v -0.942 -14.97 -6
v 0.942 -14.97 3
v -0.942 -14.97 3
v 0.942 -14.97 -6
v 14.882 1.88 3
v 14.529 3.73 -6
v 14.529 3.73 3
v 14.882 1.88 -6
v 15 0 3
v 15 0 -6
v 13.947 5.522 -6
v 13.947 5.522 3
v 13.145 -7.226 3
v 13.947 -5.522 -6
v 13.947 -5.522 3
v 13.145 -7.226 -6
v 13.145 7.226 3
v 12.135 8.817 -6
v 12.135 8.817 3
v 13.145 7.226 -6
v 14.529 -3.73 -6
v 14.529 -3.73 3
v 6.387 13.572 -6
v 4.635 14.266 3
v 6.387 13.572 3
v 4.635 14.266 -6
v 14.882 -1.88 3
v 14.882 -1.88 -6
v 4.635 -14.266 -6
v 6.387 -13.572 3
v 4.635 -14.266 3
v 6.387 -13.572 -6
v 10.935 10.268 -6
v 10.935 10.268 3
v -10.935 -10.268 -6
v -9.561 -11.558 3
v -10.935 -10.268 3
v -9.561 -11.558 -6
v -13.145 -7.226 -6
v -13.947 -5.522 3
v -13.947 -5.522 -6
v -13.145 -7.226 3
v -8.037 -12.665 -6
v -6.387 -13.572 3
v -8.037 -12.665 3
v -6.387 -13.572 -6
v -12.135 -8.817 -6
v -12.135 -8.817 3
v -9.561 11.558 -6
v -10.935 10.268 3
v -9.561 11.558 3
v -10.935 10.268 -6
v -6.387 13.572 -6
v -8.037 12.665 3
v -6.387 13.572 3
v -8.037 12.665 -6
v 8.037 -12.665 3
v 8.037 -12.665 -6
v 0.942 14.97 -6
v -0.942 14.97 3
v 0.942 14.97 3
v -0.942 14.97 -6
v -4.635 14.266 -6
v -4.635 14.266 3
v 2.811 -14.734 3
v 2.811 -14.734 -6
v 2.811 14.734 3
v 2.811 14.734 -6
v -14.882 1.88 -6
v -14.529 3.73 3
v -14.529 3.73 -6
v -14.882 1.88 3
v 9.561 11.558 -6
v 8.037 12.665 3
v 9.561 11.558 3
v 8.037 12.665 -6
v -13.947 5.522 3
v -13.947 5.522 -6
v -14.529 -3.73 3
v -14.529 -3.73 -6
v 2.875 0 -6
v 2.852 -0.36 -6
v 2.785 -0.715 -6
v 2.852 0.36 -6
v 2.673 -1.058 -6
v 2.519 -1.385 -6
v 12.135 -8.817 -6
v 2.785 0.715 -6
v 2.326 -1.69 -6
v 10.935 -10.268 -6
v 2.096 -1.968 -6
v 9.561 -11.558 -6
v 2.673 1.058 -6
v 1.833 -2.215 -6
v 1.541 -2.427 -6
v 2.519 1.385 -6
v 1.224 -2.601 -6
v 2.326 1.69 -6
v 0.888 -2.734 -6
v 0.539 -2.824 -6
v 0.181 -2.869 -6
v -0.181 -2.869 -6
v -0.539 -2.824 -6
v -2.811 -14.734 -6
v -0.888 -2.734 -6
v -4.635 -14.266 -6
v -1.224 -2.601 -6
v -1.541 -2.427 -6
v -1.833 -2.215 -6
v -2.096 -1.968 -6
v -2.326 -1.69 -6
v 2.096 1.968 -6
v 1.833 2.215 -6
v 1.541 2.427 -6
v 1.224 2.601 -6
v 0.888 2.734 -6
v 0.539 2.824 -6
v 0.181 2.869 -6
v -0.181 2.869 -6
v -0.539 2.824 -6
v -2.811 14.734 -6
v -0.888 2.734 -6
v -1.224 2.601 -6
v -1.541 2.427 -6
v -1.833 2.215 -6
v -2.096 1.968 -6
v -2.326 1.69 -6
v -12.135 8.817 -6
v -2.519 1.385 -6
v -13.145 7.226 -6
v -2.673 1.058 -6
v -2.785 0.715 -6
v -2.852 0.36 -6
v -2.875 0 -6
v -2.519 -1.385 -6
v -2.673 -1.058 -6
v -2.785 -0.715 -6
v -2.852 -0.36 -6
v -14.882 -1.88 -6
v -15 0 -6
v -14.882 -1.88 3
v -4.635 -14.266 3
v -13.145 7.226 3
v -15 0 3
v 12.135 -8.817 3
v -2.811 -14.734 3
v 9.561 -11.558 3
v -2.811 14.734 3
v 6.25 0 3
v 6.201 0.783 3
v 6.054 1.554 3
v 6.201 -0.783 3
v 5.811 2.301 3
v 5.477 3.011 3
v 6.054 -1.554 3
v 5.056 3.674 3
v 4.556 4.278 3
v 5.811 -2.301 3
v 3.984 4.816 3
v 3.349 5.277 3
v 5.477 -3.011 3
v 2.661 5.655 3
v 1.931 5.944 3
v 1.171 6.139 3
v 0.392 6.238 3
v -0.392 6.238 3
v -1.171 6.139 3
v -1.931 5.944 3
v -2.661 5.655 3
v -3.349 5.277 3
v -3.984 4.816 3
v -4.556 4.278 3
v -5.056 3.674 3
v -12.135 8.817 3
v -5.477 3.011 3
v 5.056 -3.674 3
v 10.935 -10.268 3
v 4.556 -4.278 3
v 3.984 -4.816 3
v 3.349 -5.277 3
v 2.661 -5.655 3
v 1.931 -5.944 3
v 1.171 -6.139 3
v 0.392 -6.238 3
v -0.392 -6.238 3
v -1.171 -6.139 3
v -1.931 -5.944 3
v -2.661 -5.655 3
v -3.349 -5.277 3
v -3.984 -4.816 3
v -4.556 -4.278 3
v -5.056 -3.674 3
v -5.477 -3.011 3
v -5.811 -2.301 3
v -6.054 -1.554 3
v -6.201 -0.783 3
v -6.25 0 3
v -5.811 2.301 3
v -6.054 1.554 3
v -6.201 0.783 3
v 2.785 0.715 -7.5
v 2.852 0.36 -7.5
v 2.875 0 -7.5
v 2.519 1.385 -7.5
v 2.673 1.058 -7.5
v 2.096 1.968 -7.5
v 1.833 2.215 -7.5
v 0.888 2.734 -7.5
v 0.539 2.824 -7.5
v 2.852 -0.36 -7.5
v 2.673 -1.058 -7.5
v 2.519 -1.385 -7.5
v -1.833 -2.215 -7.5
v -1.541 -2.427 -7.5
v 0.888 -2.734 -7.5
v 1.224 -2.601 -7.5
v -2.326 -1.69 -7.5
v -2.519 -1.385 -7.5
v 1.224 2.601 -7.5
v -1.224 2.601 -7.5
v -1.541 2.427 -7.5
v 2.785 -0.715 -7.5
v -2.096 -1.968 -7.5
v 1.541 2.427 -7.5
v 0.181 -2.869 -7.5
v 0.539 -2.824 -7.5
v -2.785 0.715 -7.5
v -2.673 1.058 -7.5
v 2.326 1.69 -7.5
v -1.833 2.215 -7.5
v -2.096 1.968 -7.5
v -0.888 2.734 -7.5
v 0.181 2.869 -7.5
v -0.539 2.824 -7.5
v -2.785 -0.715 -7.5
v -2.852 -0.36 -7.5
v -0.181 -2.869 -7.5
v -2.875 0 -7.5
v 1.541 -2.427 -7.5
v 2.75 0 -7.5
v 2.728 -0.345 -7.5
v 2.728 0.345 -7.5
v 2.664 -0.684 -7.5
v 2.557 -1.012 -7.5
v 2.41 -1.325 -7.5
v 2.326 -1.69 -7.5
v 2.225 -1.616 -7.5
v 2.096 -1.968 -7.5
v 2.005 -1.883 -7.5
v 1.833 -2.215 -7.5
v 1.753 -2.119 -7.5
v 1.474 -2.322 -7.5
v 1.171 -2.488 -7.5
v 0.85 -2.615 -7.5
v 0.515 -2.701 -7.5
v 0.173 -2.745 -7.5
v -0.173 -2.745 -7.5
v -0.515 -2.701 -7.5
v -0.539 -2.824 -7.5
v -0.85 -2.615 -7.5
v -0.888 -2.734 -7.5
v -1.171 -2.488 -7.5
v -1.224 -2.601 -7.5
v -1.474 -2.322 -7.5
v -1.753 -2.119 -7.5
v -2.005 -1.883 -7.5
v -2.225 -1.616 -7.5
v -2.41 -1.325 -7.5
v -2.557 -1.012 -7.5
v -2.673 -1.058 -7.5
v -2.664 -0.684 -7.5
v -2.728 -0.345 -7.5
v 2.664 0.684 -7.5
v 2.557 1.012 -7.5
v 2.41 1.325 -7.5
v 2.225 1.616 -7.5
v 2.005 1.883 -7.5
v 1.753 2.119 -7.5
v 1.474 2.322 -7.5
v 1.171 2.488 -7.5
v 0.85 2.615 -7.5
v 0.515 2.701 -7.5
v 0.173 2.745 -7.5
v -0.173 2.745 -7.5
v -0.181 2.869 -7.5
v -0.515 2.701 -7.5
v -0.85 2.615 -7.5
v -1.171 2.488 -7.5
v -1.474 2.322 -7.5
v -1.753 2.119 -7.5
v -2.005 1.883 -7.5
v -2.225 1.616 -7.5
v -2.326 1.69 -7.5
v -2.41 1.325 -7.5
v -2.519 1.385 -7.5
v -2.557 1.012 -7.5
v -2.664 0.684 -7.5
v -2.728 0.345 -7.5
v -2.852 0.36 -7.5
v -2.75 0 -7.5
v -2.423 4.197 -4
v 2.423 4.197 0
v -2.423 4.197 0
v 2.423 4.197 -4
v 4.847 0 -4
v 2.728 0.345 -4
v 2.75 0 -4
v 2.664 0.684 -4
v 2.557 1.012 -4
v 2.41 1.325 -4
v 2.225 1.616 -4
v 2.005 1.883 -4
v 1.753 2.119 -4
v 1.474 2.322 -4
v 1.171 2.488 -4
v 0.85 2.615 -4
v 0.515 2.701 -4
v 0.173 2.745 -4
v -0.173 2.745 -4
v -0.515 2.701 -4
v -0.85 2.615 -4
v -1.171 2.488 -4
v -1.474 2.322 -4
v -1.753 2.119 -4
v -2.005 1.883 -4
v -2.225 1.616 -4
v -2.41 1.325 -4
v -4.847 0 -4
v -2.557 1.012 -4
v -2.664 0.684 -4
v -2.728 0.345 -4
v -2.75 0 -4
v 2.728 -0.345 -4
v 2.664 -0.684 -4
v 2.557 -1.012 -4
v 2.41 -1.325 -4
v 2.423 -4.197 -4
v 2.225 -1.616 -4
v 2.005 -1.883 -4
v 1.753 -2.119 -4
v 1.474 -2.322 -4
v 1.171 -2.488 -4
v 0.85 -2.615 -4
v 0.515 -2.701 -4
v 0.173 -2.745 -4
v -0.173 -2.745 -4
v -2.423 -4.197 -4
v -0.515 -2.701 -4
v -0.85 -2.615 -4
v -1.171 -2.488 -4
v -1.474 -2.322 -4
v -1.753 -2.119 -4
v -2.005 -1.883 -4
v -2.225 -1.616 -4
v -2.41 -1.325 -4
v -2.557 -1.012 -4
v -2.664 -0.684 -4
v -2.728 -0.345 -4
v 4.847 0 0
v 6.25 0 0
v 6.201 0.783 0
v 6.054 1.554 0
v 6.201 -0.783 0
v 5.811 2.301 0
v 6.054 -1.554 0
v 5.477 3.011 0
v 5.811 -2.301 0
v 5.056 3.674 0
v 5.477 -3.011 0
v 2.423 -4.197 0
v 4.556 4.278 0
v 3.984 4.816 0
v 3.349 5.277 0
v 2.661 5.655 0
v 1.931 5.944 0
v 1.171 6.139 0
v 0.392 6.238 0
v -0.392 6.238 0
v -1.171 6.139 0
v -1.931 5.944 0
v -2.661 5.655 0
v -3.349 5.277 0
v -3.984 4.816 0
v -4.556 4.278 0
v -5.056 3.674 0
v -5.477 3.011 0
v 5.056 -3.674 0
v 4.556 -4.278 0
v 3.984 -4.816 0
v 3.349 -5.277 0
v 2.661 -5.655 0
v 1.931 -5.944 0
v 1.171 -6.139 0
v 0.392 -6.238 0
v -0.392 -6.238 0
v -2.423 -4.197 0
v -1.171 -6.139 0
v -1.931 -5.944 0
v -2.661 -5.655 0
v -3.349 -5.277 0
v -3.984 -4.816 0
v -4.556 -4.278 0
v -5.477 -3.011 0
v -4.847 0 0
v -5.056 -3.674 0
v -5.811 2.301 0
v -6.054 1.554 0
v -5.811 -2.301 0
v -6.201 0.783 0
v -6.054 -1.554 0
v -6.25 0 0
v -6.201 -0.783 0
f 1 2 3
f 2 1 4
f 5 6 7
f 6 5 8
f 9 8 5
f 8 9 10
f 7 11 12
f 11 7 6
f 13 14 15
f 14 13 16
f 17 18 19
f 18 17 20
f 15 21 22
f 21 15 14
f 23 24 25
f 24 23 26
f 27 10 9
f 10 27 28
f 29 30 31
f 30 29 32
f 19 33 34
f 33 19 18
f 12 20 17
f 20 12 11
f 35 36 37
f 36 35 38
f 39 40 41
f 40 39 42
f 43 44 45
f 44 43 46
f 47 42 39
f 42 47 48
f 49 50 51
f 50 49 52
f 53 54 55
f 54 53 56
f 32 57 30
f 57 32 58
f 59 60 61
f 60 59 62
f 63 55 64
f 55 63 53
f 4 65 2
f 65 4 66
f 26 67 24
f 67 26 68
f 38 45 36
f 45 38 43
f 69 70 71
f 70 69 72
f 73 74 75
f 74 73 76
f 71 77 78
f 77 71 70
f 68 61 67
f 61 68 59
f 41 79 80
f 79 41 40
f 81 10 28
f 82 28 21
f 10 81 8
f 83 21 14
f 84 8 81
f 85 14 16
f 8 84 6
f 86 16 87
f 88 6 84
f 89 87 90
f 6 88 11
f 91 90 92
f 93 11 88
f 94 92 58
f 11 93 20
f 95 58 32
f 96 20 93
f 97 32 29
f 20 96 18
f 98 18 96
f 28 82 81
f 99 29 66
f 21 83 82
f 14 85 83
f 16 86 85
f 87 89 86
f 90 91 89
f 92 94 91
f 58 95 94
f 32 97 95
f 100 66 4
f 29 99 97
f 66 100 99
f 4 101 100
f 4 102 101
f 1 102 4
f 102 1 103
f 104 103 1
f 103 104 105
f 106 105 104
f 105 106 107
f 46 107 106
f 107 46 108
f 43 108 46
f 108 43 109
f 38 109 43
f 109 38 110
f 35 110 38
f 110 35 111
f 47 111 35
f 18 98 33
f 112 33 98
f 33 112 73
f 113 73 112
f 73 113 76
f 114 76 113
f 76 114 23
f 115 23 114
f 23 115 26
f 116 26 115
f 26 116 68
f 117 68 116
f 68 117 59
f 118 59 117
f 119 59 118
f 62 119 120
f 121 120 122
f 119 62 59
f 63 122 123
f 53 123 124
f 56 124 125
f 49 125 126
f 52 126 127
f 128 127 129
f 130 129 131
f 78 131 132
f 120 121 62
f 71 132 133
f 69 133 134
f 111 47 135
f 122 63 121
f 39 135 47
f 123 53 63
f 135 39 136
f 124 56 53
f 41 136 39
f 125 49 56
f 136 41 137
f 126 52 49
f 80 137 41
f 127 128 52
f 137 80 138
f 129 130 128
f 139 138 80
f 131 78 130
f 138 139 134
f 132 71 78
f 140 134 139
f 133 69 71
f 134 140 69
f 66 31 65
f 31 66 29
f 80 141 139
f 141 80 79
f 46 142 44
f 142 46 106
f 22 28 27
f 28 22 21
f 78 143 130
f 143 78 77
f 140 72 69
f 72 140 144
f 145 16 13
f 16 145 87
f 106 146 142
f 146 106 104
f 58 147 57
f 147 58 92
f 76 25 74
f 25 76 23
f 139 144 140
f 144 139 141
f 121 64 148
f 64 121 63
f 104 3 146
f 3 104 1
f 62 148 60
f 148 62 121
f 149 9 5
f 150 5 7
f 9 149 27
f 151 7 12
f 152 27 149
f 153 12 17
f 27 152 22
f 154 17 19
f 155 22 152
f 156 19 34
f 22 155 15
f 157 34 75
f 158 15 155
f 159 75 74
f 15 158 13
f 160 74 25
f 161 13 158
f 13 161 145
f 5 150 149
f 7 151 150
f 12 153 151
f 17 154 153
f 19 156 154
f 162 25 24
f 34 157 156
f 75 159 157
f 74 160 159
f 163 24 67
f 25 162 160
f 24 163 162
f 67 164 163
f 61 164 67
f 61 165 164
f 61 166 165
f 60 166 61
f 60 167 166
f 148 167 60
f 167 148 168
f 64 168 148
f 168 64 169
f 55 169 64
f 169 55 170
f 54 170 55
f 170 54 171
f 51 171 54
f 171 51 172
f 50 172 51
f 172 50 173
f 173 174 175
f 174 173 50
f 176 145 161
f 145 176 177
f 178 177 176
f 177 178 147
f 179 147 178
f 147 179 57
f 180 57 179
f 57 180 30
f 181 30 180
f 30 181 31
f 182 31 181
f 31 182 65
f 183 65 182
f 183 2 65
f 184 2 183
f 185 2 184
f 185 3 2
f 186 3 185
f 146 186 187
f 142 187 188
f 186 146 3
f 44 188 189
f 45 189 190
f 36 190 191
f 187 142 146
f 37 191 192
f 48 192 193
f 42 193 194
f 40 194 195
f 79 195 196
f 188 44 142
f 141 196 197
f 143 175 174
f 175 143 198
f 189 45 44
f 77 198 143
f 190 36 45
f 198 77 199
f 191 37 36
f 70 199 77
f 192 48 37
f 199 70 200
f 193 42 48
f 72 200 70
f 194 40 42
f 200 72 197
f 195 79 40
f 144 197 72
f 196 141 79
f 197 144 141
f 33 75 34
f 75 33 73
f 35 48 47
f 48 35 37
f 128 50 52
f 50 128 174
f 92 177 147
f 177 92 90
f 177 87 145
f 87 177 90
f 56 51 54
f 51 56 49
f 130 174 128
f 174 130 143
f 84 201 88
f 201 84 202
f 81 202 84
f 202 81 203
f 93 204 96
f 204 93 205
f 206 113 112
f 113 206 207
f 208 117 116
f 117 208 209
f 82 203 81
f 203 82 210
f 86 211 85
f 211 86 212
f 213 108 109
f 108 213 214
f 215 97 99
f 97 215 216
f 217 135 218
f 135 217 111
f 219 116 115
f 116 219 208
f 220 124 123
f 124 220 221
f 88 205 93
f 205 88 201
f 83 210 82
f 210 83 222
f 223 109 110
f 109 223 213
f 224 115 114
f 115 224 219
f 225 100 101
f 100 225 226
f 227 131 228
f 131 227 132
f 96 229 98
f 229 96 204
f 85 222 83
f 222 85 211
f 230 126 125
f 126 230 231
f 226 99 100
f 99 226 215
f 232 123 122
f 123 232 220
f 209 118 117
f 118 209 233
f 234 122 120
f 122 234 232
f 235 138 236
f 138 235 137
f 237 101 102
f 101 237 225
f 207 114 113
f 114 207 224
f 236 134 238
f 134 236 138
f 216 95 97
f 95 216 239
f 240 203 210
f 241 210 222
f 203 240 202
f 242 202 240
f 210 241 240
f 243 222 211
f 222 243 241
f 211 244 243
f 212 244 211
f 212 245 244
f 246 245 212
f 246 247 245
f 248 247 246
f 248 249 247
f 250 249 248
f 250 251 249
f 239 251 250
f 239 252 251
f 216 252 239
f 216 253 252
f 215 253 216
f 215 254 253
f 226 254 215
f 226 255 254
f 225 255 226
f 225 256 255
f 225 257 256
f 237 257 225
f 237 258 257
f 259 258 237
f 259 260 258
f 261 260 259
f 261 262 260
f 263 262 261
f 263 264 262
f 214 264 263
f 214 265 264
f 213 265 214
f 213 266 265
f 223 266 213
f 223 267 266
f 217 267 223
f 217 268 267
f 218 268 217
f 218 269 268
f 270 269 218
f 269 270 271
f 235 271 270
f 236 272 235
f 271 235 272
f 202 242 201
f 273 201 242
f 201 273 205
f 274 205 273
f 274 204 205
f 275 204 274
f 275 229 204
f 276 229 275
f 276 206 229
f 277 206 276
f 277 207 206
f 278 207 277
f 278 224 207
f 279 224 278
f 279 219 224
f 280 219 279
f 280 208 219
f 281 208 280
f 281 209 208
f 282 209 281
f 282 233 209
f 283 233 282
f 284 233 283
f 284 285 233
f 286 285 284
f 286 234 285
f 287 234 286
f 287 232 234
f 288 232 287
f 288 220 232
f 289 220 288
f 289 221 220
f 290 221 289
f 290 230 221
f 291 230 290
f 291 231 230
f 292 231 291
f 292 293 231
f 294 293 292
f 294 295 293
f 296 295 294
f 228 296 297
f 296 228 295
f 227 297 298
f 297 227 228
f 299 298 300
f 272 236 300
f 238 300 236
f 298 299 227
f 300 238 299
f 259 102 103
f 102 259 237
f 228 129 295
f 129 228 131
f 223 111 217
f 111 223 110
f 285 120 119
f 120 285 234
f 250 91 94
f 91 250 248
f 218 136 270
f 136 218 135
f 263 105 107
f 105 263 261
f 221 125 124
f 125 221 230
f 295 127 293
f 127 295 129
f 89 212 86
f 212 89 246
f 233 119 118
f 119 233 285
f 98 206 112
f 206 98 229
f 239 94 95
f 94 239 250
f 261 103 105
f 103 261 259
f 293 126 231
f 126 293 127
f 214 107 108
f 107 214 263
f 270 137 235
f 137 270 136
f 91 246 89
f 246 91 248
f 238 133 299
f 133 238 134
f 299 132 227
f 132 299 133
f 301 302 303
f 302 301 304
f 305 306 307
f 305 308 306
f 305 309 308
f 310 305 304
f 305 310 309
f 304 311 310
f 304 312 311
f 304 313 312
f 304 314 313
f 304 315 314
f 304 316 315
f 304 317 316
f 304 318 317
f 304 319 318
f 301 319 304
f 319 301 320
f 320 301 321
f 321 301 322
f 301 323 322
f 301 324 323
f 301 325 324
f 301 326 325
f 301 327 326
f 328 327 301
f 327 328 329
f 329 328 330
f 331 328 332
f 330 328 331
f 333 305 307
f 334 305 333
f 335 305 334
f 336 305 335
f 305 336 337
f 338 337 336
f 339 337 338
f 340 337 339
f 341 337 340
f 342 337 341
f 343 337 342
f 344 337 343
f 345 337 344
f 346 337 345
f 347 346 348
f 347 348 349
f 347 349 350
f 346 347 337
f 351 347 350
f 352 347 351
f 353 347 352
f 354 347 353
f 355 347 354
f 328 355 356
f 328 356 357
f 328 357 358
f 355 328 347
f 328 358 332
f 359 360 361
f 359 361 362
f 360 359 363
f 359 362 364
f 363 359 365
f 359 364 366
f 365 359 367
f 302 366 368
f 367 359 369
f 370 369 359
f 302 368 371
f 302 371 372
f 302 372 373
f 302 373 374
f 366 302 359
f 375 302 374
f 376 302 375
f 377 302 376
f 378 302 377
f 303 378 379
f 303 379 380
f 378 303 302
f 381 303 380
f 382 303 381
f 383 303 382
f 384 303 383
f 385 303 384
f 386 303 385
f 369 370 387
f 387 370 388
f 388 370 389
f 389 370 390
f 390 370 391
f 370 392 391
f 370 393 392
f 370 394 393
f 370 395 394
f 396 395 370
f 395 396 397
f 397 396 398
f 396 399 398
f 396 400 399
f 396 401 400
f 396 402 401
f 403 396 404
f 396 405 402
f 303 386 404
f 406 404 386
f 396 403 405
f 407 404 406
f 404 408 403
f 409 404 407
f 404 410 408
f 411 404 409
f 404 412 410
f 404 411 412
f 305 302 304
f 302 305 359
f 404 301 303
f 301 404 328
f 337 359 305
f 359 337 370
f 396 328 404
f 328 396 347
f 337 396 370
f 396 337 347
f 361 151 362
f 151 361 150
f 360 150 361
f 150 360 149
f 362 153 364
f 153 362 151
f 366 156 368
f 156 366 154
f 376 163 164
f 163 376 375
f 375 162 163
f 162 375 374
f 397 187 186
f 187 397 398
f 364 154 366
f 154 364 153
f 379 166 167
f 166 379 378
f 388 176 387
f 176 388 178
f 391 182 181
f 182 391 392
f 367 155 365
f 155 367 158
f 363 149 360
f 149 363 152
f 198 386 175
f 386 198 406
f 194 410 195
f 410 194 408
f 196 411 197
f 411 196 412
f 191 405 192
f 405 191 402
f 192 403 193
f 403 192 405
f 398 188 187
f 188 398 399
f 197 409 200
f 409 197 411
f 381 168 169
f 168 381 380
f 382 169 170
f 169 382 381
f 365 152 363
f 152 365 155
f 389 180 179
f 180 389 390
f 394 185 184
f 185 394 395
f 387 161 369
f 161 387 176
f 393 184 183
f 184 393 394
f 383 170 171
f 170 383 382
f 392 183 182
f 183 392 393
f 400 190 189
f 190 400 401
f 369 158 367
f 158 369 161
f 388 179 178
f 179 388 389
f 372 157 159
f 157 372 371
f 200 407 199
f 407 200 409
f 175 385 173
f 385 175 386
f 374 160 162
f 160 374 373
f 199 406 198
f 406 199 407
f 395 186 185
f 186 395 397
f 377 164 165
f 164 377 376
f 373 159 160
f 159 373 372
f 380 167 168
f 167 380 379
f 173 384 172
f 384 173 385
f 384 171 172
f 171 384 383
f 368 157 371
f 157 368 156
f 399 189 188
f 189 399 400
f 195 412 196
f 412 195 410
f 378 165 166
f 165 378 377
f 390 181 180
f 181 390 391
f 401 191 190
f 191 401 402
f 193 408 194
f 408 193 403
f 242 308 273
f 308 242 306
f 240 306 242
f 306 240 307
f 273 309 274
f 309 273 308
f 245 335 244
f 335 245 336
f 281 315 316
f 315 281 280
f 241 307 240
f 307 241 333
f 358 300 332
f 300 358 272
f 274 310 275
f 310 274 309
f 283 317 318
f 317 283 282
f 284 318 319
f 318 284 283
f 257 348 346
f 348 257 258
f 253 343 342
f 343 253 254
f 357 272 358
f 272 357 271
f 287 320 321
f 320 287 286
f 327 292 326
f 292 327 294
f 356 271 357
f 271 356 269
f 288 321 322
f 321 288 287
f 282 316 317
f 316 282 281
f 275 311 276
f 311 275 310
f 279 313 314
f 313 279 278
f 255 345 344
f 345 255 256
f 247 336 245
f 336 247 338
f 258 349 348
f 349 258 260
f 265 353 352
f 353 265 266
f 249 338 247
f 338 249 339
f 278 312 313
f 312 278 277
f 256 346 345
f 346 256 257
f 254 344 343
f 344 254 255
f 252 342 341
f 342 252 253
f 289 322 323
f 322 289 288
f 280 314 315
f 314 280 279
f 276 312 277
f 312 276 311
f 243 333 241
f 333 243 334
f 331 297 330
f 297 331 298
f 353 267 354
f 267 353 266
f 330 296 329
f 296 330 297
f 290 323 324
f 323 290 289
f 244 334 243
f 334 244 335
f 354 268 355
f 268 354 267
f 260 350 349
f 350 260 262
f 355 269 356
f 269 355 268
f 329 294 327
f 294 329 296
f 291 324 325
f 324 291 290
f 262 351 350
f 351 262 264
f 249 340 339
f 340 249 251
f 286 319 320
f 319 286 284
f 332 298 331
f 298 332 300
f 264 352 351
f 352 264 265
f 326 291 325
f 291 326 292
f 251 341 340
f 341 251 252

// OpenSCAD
$fn = 50;


difference() {
	union() {
		translate(v = [0, 0, -6.0000000000]) {
			cylinder(h = 9.0000000000, r = 15.0000000000);
		}
		#translate(v = [0, 0, -7.5000000000]) {
			cylinder(h = 7.5000000000, r = 2.8750000000);
		}
	}
	union() {
		translate(v = [0, 0, 0]) {
			rotate(a = [0, 0, 0]) {
				difference() {
					union() {
						translate(v = [0, 0, -4]) {
							linear_extrude(height = 4) {
								polygon(points = [[4.8468000000, 0.0000000000], [2.4234000000, 4.1974519271], [-2.4234000000, 4.1974519271], [-4.8468000000, 0.0000000000], [-2.4234000000, -4.1974519271], [2.4234000000, -4.1974519271]]);
							}
						}
					}
					union();
				}
			}
		}
		#cylinder(h = 3, r = 6.2500000000);
		#translate(v = [0, 0, -100.0000000000]) {
			cylinder(h = 200, r = 2.7500000000);
		}
	}
}
